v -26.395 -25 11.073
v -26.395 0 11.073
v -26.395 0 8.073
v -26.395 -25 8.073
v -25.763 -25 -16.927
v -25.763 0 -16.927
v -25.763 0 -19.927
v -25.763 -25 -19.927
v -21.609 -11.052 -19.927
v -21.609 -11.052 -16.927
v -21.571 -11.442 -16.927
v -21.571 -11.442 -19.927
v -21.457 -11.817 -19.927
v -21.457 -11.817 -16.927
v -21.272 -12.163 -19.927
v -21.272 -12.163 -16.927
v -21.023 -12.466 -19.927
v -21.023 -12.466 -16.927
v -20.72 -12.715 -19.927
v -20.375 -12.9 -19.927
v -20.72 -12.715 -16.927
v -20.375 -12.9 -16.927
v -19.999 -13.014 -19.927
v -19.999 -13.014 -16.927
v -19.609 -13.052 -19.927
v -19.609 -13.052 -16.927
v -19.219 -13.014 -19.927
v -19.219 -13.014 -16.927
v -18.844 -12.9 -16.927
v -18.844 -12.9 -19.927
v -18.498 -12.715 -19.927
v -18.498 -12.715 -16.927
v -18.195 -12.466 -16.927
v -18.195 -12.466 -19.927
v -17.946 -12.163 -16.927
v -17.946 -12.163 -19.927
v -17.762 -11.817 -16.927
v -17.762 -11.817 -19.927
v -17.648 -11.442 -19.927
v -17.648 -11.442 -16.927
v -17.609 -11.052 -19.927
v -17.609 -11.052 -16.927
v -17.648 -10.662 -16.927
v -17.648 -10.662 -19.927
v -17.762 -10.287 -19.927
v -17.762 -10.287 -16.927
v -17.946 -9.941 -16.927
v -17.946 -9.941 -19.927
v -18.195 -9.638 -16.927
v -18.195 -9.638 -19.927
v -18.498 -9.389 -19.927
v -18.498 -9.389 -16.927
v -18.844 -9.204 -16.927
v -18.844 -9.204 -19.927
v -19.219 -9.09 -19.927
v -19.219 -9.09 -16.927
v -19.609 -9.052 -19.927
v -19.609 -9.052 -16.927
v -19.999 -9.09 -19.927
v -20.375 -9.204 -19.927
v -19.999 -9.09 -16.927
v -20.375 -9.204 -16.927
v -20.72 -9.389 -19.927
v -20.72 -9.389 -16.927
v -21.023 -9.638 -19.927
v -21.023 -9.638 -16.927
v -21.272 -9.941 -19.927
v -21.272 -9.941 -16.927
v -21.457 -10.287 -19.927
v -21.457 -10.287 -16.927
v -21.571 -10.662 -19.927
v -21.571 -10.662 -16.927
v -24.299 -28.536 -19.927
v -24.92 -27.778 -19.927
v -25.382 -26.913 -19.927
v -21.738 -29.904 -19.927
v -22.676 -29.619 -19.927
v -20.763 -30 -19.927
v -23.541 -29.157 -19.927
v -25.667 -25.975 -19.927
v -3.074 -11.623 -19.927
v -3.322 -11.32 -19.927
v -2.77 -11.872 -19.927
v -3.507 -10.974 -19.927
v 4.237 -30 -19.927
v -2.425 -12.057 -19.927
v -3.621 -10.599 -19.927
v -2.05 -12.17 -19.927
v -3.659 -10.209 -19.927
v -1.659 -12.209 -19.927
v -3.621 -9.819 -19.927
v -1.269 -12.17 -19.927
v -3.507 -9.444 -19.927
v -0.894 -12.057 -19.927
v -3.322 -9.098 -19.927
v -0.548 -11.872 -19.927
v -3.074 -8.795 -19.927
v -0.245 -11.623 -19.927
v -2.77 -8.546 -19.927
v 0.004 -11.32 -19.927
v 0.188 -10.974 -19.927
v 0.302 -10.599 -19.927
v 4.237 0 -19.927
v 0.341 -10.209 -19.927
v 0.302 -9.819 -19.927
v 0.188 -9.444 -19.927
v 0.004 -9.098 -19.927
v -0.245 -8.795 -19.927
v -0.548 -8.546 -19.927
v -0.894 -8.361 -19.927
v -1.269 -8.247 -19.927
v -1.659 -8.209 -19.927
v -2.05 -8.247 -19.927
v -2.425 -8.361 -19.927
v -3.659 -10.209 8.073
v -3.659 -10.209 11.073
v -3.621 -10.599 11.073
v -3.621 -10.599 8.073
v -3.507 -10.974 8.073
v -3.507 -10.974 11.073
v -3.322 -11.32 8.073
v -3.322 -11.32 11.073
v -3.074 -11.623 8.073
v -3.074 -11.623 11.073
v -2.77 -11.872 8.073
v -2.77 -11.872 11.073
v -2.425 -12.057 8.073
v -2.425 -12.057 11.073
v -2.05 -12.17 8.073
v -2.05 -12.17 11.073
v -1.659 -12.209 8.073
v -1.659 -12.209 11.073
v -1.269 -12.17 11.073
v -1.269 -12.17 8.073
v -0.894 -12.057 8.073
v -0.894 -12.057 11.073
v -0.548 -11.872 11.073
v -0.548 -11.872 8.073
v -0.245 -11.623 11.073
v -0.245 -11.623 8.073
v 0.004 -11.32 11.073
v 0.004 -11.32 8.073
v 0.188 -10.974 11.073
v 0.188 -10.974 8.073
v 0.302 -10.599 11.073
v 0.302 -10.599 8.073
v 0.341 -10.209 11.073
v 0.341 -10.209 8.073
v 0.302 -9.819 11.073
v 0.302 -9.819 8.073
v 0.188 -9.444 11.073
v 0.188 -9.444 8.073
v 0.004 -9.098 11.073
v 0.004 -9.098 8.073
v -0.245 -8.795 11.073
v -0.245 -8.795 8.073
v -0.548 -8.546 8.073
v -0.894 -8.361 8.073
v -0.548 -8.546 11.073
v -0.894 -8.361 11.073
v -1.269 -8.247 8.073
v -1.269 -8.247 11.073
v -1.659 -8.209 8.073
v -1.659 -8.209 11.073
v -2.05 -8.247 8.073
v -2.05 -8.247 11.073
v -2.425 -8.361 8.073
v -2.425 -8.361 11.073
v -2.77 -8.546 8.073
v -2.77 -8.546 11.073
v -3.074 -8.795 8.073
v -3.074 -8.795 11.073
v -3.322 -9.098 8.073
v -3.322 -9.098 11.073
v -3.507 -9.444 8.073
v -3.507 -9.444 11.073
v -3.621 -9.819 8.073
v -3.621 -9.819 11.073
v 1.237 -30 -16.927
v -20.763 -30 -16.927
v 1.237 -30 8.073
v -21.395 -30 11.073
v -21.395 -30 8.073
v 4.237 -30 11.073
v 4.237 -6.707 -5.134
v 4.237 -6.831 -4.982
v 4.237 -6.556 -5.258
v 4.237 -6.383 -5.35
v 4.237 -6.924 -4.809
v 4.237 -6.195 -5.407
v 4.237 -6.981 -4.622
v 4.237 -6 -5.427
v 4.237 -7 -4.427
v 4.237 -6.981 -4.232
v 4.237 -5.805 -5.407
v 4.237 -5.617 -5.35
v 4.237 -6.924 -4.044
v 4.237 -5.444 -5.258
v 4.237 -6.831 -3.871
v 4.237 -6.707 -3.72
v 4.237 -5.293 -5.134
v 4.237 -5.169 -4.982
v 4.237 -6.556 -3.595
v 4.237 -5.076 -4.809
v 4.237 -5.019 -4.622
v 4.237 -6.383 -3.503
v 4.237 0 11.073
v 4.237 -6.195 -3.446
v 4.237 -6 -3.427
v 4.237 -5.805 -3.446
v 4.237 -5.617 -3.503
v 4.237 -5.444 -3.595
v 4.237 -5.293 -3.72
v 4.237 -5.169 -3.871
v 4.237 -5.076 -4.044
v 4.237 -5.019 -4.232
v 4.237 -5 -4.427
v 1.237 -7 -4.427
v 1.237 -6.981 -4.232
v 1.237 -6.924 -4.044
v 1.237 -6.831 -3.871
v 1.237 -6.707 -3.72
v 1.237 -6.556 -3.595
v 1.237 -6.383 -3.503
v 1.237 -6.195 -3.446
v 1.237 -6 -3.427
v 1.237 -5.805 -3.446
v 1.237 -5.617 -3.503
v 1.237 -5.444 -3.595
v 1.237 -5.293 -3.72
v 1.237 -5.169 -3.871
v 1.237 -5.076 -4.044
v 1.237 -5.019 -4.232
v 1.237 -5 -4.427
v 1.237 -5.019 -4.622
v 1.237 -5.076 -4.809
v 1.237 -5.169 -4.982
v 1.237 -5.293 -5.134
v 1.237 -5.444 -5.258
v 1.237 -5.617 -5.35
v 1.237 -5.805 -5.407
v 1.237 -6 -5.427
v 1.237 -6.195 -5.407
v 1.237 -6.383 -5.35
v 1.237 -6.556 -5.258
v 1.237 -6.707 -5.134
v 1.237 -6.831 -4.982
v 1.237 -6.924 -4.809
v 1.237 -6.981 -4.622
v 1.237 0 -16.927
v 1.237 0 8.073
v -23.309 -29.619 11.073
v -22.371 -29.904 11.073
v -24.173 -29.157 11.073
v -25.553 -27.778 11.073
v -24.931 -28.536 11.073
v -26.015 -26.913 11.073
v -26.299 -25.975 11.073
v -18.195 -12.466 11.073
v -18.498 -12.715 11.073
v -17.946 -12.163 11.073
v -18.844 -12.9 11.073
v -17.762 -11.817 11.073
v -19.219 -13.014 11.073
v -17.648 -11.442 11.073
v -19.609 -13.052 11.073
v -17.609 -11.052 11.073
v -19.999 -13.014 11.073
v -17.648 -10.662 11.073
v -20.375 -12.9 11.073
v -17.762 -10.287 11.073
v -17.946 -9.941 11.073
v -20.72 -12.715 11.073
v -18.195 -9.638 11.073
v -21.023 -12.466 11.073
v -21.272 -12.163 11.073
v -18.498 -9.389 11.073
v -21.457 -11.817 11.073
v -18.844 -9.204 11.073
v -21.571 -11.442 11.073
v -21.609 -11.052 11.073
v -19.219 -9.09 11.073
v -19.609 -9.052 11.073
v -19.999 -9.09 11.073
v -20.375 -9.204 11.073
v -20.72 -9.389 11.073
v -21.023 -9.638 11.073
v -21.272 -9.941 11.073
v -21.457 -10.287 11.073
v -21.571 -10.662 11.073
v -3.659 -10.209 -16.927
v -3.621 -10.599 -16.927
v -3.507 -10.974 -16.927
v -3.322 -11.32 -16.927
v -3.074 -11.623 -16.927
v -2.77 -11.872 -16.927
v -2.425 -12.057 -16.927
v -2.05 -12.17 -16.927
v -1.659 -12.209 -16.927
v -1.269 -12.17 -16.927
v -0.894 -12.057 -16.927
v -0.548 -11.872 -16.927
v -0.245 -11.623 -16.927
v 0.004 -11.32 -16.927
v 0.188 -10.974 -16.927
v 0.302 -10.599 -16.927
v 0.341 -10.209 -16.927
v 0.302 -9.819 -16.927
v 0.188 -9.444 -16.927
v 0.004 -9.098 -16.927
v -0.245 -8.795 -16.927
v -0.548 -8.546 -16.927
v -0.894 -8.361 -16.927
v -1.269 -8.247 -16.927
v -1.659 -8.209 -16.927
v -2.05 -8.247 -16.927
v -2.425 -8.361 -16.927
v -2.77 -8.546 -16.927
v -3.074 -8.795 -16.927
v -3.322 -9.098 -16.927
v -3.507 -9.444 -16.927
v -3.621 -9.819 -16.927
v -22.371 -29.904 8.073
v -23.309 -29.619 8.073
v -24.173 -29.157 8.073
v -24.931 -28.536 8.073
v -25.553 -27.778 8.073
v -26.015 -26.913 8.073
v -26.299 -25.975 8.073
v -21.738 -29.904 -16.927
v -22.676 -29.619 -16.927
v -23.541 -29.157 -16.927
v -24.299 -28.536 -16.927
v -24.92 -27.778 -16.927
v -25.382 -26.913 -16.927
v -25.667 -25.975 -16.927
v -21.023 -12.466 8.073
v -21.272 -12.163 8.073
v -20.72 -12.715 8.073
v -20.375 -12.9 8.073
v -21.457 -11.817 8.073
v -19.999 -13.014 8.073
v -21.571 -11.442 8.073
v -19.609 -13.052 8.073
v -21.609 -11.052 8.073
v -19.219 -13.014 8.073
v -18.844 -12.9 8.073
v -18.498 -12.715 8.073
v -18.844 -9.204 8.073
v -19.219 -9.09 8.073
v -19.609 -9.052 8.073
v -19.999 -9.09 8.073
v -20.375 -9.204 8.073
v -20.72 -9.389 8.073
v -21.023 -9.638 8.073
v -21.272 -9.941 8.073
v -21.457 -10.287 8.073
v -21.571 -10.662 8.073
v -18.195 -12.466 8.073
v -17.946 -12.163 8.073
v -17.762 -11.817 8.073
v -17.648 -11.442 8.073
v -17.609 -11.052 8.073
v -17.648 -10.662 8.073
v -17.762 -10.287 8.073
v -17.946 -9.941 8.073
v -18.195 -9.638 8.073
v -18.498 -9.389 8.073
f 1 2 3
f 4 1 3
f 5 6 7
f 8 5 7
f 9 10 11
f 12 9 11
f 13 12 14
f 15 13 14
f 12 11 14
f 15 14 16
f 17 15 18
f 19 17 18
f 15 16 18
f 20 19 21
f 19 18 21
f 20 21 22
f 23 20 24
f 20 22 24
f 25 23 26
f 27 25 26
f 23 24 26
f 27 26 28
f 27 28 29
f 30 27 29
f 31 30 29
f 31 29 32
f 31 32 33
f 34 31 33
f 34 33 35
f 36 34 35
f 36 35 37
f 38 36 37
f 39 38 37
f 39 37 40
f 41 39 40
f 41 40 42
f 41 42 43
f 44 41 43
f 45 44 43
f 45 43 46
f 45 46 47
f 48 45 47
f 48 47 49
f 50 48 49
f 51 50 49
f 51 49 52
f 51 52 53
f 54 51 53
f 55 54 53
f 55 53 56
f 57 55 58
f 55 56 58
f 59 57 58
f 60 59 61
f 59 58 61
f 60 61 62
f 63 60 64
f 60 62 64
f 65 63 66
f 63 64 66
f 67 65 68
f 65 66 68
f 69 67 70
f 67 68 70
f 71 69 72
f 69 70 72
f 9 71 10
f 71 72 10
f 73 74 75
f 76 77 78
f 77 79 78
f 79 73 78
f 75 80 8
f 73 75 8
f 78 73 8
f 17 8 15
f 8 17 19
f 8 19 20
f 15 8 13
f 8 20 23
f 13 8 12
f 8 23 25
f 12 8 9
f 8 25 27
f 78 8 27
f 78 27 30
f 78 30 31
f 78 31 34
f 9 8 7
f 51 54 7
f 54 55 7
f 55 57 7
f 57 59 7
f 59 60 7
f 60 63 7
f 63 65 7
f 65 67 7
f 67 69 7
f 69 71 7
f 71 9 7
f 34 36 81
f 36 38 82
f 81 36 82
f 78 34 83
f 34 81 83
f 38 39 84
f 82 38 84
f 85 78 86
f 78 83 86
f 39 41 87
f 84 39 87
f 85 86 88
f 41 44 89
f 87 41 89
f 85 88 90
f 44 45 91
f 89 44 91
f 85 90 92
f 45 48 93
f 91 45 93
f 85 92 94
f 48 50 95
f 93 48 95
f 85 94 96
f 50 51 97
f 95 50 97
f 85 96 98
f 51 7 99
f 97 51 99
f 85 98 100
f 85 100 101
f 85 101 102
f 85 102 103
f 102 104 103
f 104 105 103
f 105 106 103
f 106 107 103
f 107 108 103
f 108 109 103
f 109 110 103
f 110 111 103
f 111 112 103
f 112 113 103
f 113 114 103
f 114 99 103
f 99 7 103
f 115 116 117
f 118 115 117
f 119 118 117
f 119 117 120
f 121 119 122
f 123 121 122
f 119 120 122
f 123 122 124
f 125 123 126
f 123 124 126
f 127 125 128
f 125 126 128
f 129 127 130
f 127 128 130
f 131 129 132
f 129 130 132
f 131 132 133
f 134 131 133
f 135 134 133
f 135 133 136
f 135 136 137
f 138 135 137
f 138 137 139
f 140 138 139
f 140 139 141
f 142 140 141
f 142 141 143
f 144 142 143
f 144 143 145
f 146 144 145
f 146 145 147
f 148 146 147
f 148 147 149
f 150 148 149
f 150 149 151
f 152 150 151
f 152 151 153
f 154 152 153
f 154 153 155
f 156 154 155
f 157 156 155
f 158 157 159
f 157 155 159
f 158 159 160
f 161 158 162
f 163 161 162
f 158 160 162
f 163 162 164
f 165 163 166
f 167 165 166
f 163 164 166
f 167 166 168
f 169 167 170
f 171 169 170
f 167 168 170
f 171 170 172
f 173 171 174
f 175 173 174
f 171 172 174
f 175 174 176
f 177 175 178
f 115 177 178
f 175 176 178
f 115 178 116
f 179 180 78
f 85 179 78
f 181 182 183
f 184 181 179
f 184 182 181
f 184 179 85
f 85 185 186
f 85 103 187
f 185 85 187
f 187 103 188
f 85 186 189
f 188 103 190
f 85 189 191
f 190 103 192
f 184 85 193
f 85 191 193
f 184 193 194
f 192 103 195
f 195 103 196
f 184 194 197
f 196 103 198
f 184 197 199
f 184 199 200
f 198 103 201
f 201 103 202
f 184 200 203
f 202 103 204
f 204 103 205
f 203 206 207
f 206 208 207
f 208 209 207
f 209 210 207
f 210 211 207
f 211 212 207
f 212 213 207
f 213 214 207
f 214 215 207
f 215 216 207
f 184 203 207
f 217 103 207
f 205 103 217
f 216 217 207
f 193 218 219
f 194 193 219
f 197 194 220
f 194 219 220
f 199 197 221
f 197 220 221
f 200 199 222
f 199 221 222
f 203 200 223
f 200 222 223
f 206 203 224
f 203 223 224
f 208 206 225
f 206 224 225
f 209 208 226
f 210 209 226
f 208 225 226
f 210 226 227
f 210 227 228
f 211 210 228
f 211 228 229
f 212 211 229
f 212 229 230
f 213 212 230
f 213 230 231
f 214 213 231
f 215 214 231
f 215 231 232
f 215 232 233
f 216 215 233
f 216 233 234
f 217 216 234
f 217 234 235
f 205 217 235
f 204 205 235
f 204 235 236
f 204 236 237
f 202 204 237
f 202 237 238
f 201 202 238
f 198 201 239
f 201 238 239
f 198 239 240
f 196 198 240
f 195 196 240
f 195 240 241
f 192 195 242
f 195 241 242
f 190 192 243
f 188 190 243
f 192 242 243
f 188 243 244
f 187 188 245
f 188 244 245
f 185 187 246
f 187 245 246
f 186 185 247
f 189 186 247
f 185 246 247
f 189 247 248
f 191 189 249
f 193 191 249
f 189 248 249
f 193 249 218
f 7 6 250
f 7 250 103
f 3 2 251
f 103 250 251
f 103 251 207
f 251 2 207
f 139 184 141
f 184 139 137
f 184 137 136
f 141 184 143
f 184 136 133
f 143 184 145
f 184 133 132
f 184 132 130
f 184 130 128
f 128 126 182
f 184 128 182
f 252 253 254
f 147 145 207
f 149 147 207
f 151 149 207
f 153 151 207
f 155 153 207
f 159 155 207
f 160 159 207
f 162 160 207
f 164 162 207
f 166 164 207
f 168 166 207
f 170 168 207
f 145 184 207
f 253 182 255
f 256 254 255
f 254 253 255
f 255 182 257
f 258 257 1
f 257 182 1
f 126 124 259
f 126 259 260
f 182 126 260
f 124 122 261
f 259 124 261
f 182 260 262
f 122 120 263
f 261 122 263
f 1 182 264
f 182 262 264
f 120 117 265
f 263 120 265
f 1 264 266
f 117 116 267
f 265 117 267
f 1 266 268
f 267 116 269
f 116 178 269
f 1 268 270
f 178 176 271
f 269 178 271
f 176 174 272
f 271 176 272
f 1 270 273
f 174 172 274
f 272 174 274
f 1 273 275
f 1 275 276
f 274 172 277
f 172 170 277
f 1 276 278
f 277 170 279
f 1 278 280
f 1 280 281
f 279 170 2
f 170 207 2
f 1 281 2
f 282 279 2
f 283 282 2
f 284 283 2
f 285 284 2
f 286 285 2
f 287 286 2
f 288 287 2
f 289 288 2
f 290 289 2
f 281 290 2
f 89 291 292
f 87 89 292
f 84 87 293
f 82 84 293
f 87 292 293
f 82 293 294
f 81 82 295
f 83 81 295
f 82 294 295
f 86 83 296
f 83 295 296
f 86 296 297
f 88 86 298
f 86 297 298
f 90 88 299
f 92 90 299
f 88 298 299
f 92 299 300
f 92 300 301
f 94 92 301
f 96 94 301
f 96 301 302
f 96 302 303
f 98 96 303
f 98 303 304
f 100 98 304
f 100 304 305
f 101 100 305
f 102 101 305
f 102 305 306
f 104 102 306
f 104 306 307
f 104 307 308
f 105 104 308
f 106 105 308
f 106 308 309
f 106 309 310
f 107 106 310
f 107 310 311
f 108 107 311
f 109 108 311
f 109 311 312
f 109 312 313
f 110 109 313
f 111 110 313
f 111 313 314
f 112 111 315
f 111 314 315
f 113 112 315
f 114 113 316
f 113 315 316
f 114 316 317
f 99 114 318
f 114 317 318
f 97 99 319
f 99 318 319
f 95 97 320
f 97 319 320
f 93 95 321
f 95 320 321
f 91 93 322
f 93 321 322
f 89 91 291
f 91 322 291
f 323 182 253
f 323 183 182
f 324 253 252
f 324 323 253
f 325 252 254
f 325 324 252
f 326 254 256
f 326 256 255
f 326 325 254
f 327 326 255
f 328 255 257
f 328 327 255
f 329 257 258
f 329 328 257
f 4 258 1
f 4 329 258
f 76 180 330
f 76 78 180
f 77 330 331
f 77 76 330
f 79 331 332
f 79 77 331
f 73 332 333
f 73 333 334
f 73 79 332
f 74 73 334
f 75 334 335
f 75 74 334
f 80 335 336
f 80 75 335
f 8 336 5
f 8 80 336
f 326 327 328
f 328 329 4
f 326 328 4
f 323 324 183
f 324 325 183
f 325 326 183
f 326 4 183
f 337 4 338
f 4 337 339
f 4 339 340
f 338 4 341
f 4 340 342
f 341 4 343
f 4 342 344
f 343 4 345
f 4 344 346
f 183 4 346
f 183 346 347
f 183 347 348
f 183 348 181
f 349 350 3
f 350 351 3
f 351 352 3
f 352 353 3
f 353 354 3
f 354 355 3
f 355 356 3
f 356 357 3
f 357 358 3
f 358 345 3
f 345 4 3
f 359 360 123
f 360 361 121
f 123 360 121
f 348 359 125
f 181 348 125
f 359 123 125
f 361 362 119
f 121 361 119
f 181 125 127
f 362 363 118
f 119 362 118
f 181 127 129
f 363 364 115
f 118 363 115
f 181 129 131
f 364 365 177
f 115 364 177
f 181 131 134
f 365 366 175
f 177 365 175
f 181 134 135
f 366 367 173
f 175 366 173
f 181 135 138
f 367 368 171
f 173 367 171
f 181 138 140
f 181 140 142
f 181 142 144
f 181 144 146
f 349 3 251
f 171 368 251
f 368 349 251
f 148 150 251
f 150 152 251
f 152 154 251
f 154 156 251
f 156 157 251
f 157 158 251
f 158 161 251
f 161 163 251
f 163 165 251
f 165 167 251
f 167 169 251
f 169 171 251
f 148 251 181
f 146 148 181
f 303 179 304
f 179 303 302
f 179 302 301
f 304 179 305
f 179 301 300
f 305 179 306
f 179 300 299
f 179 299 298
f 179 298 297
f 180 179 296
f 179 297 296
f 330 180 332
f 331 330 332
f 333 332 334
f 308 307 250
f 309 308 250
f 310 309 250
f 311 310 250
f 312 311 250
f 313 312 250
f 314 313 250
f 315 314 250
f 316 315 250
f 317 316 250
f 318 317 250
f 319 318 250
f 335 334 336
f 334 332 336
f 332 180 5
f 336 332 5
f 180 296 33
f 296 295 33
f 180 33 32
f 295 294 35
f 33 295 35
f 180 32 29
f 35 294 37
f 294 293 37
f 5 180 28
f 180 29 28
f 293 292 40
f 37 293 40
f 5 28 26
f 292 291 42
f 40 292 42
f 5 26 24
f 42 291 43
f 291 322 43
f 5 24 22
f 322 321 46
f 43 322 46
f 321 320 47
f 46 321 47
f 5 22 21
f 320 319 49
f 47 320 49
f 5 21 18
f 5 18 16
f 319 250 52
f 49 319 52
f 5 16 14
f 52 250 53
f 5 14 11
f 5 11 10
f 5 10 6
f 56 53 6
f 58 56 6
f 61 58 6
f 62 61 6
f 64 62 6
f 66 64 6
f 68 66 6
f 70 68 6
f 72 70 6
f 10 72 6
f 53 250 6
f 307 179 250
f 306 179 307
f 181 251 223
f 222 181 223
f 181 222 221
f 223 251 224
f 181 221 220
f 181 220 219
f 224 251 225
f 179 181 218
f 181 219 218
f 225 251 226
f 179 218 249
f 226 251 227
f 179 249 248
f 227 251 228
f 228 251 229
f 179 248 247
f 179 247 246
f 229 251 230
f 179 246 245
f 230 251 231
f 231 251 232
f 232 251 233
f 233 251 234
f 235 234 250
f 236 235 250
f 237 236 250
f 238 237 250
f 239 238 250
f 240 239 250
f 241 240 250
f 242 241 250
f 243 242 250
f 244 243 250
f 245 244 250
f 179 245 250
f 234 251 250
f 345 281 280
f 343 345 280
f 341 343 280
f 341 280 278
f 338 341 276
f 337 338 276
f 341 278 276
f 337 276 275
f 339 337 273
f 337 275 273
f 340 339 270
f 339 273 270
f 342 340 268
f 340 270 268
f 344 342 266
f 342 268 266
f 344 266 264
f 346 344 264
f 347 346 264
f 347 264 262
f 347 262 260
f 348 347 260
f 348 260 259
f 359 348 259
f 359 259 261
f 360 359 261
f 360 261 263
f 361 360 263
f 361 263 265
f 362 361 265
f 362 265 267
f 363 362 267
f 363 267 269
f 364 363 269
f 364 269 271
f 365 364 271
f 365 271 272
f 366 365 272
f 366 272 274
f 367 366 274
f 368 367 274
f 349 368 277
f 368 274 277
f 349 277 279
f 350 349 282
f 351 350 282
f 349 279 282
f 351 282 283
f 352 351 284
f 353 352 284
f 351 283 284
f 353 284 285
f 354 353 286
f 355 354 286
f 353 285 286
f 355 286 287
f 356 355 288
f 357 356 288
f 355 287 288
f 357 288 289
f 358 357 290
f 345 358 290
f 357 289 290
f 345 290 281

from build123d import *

# Parameters (mm, degrees)
F1_DEPTH = 30
F3_D     = 2
F5_D     = 4
F6_R     = 5
F7_R     = 5


with BuildPart() as f1:
    # F0 (on Front) → F1 (new body)
    with BuildSketch(Plane.XZ):
        Polygon((-25.762998, -16.926608), (-25.762998, -19.926608), (4.237002, -19.926608), (4.237002, 11.073392), (-26.395301, 11.073392), (-26.395301, 8.073392), (1.237002, 8.073392), (1.237002, -16.926608), align=None)
    extrude(amount=F1_DEPTH)

    # F3 (through all)
    with Locations(Plane.YZ.offset(4.237002)):
        with Locations((-6, -4.426608)):
            Hole(F3_D / 2)

    # F5 (through all)
    with Locations(Plane(origin=(0, 0, -19.926608), x_dir=(1, 0, 0), z_dir=(0, 0, -1))):
        with Locations((-19.609278, 11.052052), (-1.659339, 10.208893)):
            Hole(F5_D / 2)

    # F6
    f6_edges = [f1.edges().sort_by_distance(p)[0] for p in [
        (-26.395301, -30, 9.573392),
    ]]
    fillet(f6_edges, radius=F6_R)

    # F7
    f7_edges = [f1.edges().sort_by_distance(p)[0] for p in [
        (-25.762998, -30, -18.426608),
    ]]
    fillet(f7_edges, radius=F7_R)


solid = f1.part
